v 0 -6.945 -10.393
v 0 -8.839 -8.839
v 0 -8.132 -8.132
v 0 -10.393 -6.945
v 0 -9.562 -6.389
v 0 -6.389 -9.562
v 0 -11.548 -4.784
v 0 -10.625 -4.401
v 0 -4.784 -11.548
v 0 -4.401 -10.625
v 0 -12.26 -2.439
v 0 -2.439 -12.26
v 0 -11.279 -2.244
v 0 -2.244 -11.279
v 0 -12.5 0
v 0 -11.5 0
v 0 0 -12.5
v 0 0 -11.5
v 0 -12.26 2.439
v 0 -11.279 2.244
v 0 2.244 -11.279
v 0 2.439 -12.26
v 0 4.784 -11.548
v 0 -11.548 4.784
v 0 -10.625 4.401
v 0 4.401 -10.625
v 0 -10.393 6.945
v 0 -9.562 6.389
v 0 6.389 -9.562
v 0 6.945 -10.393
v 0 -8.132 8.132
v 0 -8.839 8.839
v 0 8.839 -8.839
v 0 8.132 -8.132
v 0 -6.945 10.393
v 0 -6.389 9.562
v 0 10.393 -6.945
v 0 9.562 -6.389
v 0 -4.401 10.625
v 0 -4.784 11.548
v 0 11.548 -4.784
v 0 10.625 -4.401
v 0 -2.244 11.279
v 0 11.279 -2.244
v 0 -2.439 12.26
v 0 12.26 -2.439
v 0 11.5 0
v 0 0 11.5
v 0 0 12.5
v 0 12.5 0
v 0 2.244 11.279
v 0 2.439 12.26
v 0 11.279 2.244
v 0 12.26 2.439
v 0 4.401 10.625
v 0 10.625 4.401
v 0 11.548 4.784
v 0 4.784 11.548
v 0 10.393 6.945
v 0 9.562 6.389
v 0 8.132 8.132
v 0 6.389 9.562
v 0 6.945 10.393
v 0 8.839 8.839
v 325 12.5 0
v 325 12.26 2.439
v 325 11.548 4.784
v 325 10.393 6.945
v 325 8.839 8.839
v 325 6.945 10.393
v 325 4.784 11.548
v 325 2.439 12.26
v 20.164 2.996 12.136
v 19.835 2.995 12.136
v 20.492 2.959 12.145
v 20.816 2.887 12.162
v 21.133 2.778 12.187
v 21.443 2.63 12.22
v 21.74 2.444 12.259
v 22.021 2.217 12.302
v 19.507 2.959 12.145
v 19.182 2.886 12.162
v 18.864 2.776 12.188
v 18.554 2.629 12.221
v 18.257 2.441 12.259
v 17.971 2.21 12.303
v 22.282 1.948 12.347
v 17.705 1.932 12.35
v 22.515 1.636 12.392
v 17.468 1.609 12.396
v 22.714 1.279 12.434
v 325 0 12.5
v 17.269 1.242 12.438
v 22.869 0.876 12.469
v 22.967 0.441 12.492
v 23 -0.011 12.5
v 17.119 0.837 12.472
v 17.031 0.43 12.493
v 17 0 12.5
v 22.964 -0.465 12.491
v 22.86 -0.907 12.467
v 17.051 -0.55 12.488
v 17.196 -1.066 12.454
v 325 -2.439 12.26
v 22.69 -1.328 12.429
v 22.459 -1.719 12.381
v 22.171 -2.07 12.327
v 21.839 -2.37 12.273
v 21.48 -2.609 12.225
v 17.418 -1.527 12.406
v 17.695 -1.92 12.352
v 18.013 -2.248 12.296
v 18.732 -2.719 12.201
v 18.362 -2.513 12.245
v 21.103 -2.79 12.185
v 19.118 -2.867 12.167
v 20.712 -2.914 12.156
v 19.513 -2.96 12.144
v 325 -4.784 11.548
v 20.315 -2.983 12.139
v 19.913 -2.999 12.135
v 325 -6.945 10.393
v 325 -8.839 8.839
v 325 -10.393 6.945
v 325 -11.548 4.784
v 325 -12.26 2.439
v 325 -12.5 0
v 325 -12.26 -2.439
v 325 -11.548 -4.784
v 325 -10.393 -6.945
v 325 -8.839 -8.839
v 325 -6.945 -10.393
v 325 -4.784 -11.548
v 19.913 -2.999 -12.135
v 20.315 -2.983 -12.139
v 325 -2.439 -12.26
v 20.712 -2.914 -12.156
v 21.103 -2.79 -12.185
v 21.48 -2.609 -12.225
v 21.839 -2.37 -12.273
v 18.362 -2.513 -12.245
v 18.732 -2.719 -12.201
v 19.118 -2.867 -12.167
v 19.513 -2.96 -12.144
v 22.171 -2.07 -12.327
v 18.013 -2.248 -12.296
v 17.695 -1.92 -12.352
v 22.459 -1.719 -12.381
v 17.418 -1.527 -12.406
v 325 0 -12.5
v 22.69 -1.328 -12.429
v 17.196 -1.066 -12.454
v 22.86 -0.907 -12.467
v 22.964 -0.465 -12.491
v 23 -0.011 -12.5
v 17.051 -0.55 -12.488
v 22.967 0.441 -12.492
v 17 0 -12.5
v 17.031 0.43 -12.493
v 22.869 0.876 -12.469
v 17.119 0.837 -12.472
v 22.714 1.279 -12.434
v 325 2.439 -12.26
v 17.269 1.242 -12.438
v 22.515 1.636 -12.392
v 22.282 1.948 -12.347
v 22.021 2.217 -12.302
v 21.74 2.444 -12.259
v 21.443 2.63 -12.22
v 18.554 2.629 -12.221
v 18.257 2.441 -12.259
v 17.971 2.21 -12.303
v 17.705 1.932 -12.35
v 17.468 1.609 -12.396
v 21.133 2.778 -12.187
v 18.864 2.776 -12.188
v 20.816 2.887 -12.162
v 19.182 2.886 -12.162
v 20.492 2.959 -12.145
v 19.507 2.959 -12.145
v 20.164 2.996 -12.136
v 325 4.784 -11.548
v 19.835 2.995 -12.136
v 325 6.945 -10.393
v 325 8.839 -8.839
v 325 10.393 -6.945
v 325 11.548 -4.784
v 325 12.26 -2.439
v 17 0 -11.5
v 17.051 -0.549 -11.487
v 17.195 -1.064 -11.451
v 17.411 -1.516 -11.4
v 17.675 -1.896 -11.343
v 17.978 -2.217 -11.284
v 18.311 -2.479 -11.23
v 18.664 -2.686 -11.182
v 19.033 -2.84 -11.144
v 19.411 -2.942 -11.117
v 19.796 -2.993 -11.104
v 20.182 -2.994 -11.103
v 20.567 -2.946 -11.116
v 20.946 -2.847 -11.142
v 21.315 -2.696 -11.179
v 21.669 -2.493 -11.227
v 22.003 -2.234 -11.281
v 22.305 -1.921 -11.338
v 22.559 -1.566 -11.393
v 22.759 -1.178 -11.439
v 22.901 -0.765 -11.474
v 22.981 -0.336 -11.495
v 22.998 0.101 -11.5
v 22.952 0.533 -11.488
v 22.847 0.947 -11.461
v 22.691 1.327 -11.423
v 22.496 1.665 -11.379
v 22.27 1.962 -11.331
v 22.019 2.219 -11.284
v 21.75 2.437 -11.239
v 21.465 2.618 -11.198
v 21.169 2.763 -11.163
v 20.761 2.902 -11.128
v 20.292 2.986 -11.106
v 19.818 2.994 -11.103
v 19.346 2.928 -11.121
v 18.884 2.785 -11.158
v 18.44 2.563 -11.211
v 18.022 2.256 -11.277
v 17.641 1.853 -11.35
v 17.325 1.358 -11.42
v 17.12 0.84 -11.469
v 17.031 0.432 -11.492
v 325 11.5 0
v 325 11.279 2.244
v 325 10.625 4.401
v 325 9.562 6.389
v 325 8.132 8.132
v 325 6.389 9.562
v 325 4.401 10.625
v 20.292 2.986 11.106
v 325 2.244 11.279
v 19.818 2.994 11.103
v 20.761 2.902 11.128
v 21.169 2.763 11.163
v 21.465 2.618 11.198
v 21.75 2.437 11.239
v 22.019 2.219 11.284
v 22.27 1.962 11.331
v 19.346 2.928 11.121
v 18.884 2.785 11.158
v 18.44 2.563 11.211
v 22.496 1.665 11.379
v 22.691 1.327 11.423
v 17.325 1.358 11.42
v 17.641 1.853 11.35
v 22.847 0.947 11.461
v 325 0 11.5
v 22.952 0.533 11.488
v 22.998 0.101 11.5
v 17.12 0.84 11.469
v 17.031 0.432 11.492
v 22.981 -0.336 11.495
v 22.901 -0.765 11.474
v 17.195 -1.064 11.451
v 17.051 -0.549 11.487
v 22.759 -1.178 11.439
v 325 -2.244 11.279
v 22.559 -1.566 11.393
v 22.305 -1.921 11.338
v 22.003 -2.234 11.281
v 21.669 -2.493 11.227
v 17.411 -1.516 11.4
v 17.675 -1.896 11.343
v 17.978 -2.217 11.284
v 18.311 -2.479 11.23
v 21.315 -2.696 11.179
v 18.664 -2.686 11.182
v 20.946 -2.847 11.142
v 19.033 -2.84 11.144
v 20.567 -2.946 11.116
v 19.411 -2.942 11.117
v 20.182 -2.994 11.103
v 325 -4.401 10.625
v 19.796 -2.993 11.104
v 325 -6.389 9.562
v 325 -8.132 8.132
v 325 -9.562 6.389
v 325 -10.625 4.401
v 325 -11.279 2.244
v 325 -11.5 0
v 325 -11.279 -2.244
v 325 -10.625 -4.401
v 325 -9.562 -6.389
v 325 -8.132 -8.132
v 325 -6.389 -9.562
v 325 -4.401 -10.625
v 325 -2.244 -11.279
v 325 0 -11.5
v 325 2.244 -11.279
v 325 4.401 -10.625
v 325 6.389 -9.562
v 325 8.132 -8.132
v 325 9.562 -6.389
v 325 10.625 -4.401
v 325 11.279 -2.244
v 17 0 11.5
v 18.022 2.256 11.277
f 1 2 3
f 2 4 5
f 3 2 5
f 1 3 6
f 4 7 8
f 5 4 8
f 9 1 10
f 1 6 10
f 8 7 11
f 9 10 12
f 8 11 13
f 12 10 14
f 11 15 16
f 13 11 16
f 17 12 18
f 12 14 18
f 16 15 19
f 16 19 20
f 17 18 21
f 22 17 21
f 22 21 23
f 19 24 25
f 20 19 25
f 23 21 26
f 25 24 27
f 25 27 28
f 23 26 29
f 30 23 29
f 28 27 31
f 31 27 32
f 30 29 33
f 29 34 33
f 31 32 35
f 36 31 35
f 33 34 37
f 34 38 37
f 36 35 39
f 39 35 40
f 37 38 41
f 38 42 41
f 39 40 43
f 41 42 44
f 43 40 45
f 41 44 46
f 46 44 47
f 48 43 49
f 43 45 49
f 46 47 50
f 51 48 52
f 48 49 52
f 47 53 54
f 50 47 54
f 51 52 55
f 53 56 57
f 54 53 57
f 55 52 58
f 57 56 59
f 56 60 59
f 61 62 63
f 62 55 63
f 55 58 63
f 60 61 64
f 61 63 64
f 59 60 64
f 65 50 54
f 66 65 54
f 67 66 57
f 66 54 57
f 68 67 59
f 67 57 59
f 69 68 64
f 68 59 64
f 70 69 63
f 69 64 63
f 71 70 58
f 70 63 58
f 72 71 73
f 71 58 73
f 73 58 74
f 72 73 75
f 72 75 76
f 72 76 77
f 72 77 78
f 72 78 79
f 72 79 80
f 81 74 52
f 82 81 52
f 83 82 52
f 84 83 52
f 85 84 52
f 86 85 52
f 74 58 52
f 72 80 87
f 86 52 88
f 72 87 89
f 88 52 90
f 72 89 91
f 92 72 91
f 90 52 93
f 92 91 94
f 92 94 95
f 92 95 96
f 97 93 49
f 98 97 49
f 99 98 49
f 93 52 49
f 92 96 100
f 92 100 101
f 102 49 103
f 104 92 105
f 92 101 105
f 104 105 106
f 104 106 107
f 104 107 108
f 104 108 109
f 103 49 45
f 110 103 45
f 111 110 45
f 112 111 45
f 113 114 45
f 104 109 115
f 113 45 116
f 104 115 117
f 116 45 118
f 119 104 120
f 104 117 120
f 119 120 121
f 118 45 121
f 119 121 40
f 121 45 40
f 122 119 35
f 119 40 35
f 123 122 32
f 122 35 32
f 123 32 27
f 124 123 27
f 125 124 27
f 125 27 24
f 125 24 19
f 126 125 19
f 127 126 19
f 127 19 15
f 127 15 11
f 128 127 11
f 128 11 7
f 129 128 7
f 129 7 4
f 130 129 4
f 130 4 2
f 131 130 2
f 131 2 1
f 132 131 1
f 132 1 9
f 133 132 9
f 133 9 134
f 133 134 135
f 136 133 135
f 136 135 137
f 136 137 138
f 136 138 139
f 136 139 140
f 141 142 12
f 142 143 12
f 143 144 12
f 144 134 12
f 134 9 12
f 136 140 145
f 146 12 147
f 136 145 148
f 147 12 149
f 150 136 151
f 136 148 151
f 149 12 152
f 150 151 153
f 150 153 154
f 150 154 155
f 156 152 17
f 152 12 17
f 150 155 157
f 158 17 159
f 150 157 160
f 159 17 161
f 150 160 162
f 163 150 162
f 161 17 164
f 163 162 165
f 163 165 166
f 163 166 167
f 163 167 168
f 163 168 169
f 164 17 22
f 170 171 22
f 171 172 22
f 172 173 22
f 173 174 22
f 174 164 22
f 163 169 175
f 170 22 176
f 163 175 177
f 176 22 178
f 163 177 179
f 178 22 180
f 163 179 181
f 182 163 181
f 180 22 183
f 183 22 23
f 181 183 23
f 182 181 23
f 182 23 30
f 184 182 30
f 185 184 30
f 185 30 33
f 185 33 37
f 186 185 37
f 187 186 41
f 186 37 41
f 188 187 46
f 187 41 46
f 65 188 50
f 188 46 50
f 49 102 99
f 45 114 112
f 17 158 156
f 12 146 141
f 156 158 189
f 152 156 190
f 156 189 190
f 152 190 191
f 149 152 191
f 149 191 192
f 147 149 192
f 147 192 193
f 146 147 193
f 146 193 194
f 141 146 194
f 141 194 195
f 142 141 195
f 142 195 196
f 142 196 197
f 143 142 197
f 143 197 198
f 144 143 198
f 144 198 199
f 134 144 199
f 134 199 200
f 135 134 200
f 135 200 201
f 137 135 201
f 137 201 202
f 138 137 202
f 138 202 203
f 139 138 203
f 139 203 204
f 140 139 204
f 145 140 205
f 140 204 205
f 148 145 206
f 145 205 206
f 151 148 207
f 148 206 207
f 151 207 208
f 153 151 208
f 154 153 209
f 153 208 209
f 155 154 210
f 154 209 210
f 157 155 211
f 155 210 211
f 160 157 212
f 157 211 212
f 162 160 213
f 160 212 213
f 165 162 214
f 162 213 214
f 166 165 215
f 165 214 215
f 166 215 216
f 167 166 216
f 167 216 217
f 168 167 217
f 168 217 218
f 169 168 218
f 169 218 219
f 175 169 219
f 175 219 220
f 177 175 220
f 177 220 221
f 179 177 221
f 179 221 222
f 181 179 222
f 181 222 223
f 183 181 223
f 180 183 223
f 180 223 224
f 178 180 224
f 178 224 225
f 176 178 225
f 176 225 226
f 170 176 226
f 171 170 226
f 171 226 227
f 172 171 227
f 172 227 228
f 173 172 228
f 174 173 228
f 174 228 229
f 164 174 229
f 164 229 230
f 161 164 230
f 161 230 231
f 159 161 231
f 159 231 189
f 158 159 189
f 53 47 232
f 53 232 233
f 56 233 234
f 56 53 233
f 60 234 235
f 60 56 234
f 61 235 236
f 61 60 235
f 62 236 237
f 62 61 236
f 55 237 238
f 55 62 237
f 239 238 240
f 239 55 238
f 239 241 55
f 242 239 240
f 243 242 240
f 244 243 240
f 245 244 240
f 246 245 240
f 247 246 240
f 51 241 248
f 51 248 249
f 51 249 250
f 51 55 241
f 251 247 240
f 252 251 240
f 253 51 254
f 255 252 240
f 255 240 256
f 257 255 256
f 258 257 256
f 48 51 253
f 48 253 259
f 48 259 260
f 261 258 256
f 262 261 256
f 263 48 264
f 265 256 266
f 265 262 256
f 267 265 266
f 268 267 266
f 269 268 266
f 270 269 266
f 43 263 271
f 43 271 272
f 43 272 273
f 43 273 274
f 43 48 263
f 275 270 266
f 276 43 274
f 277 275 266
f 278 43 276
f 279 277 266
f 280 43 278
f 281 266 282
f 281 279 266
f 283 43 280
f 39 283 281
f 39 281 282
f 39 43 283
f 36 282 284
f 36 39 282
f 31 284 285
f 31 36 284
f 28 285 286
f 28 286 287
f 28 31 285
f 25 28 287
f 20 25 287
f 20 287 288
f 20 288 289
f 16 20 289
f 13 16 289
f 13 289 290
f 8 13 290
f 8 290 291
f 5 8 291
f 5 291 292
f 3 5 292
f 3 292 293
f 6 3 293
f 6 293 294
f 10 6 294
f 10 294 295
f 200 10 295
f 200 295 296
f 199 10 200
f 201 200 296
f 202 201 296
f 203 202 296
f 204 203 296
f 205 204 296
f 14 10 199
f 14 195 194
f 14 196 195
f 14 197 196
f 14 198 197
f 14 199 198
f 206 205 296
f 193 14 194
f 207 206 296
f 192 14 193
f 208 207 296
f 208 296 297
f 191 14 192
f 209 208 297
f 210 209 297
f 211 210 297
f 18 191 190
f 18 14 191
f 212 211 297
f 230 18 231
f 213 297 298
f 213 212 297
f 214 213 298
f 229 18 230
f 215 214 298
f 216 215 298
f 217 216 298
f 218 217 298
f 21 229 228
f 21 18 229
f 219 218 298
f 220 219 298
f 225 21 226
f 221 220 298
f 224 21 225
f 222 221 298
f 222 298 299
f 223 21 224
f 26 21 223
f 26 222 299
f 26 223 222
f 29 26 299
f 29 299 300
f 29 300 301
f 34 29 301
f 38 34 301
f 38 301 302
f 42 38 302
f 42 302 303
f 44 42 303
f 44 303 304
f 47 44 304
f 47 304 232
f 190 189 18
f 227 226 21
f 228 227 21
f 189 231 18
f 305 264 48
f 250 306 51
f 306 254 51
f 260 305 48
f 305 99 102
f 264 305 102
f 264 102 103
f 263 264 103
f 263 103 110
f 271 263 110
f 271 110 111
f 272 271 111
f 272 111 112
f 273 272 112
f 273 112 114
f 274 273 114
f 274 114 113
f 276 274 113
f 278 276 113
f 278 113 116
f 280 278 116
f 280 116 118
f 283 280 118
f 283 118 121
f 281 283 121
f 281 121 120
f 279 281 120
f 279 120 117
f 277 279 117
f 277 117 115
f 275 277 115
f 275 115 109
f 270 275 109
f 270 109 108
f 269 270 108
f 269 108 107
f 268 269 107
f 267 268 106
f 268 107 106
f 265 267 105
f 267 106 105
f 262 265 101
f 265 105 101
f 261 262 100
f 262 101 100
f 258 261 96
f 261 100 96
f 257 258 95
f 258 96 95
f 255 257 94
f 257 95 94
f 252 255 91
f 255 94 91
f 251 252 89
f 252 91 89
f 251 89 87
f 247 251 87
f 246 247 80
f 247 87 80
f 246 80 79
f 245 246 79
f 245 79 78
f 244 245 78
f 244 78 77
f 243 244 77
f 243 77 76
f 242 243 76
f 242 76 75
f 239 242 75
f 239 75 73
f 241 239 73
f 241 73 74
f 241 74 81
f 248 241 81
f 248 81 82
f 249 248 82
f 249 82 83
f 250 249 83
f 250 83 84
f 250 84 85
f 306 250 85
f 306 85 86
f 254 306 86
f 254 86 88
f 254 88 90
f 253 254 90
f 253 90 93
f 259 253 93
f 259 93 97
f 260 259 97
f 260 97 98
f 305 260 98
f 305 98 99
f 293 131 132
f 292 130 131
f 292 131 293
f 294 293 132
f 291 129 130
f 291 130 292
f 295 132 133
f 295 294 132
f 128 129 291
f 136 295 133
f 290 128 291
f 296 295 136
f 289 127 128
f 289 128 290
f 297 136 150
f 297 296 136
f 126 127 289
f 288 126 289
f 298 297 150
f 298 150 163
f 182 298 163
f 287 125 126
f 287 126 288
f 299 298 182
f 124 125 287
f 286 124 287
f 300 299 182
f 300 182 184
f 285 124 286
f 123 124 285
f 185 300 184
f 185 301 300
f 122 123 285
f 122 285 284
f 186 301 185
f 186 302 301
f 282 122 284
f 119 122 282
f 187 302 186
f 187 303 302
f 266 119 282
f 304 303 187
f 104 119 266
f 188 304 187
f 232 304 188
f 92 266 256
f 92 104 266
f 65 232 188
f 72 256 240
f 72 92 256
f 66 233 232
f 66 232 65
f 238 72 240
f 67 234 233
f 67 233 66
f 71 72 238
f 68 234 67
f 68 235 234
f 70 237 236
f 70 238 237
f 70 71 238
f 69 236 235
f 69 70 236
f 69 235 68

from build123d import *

# Parameters (mm, degrees)
F0_R     = 12.5
F0_R_2   = 11.5
F1_DEPTH = 325
F3_D     = 6
F4_D     = 6


with BuildPart() as f1:
    # F0 (on Right) → F1 (new body)
    with BuildSketch(Plane.YZ):
        Circle(F0_R)
        Circle(F0_R_2, mode=Mode.SUBTRACT)
    extrude(amount=F1_DEPTH)

    # F3 (through all)
    with Locations(Plane(origin=(0, 0, 0), x_dir=(1, 0, 0), z_dir=(0, 0, -1))):
        with Locations((20, 0)):
            Hole(F3_D / 2)

    # F4 (through all)
    with Locations(Plane.XY):
        with Locations((20, 0)):
            Hole(F4_D / 2)


solid = f1.part
